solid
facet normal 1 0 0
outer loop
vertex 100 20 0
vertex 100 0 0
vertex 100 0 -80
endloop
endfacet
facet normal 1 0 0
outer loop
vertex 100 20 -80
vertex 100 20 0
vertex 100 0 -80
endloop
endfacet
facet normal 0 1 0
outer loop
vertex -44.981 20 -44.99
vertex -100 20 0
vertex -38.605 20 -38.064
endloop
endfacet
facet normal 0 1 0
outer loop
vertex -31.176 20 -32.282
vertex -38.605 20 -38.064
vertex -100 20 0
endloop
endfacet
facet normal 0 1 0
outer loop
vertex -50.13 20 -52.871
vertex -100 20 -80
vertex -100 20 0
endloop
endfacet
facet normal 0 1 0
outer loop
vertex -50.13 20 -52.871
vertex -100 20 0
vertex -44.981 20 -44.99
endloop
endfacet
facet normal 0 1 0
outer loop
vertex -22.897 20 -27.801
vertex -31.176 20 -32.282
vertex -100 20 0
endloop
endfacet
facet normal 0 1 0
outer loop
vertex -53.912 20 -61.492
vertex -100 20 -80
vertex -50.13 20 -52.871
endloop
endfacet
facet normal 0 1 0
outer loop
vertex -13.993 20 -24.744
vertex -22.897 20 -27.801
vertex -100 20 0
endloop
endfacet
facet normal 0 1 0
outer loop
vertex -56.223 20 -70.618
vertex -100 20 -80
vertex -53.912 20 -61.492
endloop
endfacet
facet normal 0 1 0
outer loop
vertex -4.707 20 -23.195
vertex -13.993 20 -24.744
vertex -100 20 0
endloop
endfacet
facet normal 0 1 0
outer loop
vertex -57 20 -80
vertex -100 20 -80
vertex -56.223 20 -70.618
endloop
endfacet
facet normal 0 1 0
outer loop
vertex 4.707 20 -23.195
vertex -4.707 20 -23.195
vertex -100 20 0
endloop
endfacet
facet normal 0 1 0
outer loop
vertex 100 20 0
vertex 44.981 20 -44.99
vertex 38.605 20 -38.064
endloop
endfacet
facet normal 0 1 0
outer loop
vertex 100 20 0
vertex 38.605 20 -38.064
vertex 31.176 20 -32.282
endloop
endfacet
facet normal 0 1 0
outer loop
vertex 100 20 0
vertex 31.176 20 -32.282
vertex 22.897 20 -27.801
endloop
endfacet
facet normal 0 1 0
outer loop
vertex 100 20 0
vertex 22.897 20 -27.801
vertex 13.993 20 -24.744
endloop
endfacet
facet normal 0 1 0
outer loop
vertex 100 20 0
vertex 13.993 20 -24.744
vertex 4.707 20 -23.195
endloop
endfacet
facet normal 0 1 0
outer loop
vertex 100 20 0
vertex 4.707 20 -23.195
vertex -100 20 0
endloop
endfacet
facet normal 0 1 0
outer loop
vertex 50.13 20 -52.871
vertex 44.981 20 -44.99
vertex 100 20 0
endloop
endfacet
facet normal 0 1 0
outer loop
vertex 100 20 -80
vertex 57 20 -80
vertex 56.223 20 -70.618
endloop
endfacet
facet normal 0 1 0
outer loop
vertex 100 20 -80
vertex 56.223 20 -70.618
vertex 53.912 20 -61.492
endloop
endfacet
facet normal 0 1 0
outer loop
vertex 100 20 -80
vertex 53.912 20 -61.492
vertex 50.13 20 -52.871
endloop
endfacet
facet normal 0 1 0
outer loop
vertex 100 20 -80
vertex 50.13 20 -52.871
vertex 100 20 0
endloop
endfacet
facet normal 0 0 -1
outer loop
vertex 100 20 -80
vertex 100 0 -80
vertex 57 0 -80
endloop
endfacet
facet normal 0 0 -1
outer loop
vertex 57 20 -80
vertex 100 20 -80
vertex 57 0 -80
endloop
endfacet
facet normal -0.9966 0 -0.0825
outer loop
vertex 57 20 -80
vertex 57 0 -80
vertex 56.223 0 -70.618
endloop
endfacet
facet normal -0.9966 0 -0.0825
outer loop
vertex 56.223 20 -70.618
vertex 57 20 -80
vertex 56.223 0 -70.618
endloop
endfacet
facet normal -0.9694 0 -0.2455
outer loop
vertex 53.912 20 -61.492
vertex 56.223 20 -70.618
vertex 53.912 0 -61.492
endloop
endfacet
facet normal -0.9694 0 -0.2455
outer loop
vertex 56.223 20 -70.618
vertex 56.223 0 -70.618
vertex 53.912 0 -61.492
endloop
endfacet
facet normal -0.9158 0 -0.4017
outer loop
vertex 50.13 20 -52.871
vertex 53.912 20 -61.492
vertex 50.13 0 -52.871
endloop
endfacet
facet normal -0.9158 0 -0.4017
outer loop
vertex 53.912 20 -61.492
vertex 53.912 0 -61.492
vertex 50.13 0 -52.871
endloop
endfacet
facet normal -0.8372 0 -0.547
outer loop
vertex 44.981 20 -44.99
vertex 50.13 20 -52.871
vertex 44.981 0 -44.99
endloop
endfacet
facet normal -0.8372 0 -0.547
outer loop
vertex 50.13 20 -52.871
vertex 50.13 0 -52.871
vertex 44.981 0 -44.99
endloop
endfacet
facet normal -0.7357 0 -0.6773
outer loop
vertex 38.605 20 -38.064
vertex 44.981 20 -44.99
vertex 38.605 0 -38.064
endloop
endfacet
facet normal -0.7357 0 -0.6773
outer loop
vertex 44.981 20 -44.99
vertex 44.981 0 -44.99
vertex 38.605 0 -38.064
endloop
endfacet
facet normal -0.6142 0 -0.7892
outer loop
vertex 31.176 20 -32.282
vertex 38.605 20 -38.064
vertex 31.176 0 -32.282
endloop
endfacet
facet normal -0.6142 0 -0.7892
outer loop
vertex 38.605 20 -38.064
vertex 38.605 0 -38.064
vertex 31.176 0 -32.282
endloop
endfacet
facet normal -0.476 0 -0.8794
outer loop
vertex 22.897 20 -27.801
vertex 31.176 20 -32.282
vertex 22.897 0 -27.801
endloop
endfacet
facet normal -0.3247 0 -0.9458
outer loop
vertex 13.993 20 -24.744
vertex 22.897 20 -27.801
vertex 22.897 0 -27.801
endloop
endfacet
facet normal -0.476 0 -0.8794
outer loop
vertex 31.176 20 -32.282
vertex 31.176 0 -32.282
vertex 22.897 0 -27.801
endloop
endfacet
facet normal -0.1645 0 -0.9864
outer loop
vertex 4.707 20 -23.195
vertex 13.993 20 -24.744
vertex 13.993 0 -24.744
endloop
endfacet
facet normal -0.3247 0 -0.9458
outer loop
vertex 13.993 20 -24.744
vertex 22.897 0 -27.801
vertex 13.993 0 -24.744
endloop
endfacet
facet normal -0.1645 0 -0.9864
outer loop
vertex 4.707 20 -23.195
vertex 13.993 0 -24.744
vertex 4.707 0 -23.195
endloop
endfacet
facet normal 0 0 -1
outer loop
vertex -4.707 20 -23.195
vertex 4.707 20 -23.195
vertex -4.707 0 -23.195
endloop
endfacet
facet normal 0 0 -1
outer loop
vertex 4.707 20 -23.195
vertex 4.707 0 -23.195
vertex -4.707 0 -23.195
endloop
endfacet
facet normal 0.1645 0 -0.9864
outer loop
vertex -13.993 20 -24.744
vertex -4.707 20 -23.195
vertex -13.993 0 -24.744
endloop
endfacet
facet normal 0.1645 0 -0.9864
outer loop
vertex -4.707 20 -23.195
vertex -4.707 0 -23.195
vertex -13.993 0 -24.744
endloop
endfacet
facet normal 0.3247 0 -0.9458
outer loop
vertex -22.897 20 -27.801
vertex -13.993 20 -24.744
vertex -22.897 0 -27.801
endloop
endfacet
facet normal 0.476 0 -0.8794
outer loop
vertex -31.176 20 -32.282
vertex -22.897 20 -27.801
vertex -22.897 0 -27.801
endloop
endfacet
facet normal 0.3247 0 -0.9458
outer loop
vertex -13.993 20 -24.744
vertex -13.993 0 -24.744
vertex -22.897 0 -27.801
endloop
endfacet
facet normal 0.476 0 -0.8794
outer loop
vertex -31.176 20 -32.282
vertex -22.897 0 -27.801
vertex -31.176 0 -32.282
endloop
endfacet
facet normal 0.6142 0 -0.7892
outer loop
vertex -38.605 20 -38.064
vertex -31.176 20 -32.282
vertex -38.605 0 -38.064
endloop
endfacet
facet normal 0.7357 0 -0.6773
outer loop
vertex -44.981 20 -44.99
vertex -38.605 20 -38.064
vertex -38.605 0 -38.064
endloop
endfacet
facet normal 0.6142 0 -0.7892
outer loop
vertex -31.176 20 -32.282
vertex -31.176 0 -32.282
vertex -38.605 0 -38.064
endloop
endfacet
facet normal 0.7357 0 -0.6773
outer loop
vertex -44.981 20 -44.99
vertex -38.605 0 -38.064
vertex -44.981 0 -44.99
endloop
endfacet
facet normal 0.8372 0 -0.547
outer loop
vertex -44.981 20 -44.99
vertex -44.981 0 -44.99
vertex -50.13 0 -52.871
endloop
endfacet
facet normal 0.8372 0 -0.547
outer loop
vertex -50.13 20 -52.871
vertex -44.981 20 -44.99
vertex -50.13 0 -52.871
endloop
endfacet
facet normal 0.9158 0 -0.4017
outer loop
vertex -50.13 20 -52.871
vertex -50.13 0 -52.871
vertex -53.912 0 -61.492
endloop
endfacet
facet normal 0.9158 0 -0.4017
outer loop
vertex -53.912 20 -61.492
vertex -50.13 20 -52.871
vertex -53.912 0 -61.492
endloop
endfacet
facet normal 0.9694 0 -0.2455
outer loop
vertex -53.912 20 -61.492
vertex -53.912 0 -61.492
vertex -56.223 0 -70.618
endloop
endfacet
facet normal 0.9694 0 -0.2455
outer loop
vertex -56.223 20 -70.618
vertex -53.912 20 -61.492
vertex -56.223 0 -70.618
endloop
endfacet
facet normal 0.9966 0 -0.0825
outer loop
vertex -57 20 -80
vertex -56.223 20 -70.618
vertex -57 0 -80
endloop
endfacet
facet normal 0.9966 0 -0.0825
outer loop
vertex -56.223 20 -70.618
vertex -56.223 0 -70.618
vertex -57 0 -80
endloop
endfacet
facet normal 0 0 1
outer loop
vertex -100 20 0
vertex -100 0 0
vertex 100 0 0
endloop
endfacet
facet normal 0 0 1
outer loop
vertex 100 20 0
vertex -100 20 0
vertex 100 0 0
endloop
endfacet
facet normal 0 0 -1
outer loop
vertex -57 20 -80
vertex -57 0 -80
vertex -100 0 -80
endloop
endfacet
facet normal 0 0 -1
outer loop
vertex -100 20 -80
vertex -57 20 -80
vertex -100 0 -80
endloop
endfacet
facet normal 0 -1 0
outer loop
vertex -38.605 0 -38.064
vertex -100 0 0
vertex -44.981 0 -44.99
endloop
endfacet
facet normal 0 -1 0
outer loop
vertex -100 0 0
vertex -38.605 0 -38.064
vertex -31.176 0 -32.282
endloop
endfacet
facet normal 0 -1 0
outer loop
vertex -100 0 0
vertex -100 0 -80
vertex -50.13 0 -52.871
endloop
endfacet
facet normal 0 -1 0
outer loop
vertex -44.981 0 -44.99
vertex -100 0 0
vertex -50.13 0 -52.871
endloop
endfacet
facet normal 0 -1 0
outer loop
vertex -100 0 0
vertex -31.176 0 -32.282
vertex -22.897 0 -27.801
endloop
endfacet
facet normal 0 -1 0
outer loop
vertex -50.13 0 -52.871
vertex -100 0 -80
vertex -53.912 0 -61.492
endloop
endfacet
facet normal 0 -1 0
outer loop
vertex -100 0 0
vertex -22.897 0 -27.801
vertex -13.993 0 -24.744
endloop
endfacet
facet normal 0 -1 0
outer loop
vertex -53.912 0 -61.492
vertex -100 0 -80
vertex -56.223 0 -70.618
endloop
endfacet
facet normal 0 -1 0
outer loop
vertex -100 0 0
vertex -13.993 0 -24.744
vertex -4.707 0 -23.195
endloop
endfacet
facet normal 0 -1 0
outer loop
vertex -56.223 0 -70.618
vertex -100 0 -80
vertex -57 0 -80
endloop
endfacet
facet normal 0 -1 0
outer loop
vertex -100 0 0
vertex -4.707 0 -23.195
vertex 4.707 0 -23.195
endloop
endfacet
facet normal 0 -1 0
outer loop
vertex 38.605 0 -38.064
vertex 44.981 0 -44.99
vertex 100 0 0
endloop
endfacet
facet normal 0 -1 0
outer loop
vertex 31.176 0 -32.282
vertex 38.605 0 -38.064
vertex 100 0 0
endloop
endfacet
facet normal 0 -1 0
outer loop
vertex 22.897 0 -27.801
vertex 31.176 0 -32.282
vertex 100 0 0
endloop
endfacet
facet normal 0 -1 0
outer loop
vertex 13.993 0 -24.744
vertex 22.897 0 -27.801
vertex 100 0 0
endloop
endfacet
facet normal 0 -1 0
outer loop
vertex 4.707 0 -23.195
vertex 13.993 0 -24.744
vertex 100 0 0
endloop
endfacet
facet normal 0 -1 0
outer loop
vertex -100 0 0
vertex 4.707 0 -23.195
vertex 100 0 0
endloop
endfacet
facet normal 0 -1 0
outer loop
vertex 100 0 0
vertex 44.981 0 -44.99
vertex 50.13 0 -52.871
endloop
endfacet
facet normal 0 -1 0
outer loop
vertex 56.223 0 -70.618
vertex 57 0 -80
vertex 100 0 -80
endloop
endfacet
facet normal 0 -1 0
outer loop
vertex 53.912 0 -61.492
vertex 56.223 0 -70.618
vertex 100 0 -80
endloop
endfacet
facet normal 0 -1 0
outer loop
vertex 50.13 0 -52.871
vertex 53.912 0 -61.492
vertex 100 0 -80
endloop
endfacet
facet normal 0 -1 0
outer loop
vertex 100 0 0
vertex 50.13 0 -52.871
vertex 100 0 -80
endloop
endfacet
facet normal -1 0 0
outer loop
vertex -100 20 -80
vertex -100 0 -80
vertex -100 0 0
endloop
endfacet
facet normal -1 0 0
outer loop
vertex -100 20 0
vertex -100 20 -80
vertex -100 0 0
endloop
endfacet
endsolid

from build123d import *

# Parameters (mm, degrees)
EXTRUDE_1_DEPTH = 20


with BuildPart() as part:
    # Эскиз1 → Бобышка-Вытянуть1 (new body)
    with BuildSketch(Plane(origin=(0, 0, 0), x_dir=(1, 0, 0), z_dir=(0, 1, 0))):
        with BuildLine():
            Line((-100, 0), (100, 0))
            Line((100, 0), (100, 80))
            Line((100, 80), (57, 80))
            ThreePointArc((57, 80), (0, 23), (-57, 80))
            Line((-57, 80), (-100, 80))
            Line((-100, 80), (-100, 0))
        make_face()
    extrude(amount=EXTRUDE_1_DEPTH)


solid = part.part
